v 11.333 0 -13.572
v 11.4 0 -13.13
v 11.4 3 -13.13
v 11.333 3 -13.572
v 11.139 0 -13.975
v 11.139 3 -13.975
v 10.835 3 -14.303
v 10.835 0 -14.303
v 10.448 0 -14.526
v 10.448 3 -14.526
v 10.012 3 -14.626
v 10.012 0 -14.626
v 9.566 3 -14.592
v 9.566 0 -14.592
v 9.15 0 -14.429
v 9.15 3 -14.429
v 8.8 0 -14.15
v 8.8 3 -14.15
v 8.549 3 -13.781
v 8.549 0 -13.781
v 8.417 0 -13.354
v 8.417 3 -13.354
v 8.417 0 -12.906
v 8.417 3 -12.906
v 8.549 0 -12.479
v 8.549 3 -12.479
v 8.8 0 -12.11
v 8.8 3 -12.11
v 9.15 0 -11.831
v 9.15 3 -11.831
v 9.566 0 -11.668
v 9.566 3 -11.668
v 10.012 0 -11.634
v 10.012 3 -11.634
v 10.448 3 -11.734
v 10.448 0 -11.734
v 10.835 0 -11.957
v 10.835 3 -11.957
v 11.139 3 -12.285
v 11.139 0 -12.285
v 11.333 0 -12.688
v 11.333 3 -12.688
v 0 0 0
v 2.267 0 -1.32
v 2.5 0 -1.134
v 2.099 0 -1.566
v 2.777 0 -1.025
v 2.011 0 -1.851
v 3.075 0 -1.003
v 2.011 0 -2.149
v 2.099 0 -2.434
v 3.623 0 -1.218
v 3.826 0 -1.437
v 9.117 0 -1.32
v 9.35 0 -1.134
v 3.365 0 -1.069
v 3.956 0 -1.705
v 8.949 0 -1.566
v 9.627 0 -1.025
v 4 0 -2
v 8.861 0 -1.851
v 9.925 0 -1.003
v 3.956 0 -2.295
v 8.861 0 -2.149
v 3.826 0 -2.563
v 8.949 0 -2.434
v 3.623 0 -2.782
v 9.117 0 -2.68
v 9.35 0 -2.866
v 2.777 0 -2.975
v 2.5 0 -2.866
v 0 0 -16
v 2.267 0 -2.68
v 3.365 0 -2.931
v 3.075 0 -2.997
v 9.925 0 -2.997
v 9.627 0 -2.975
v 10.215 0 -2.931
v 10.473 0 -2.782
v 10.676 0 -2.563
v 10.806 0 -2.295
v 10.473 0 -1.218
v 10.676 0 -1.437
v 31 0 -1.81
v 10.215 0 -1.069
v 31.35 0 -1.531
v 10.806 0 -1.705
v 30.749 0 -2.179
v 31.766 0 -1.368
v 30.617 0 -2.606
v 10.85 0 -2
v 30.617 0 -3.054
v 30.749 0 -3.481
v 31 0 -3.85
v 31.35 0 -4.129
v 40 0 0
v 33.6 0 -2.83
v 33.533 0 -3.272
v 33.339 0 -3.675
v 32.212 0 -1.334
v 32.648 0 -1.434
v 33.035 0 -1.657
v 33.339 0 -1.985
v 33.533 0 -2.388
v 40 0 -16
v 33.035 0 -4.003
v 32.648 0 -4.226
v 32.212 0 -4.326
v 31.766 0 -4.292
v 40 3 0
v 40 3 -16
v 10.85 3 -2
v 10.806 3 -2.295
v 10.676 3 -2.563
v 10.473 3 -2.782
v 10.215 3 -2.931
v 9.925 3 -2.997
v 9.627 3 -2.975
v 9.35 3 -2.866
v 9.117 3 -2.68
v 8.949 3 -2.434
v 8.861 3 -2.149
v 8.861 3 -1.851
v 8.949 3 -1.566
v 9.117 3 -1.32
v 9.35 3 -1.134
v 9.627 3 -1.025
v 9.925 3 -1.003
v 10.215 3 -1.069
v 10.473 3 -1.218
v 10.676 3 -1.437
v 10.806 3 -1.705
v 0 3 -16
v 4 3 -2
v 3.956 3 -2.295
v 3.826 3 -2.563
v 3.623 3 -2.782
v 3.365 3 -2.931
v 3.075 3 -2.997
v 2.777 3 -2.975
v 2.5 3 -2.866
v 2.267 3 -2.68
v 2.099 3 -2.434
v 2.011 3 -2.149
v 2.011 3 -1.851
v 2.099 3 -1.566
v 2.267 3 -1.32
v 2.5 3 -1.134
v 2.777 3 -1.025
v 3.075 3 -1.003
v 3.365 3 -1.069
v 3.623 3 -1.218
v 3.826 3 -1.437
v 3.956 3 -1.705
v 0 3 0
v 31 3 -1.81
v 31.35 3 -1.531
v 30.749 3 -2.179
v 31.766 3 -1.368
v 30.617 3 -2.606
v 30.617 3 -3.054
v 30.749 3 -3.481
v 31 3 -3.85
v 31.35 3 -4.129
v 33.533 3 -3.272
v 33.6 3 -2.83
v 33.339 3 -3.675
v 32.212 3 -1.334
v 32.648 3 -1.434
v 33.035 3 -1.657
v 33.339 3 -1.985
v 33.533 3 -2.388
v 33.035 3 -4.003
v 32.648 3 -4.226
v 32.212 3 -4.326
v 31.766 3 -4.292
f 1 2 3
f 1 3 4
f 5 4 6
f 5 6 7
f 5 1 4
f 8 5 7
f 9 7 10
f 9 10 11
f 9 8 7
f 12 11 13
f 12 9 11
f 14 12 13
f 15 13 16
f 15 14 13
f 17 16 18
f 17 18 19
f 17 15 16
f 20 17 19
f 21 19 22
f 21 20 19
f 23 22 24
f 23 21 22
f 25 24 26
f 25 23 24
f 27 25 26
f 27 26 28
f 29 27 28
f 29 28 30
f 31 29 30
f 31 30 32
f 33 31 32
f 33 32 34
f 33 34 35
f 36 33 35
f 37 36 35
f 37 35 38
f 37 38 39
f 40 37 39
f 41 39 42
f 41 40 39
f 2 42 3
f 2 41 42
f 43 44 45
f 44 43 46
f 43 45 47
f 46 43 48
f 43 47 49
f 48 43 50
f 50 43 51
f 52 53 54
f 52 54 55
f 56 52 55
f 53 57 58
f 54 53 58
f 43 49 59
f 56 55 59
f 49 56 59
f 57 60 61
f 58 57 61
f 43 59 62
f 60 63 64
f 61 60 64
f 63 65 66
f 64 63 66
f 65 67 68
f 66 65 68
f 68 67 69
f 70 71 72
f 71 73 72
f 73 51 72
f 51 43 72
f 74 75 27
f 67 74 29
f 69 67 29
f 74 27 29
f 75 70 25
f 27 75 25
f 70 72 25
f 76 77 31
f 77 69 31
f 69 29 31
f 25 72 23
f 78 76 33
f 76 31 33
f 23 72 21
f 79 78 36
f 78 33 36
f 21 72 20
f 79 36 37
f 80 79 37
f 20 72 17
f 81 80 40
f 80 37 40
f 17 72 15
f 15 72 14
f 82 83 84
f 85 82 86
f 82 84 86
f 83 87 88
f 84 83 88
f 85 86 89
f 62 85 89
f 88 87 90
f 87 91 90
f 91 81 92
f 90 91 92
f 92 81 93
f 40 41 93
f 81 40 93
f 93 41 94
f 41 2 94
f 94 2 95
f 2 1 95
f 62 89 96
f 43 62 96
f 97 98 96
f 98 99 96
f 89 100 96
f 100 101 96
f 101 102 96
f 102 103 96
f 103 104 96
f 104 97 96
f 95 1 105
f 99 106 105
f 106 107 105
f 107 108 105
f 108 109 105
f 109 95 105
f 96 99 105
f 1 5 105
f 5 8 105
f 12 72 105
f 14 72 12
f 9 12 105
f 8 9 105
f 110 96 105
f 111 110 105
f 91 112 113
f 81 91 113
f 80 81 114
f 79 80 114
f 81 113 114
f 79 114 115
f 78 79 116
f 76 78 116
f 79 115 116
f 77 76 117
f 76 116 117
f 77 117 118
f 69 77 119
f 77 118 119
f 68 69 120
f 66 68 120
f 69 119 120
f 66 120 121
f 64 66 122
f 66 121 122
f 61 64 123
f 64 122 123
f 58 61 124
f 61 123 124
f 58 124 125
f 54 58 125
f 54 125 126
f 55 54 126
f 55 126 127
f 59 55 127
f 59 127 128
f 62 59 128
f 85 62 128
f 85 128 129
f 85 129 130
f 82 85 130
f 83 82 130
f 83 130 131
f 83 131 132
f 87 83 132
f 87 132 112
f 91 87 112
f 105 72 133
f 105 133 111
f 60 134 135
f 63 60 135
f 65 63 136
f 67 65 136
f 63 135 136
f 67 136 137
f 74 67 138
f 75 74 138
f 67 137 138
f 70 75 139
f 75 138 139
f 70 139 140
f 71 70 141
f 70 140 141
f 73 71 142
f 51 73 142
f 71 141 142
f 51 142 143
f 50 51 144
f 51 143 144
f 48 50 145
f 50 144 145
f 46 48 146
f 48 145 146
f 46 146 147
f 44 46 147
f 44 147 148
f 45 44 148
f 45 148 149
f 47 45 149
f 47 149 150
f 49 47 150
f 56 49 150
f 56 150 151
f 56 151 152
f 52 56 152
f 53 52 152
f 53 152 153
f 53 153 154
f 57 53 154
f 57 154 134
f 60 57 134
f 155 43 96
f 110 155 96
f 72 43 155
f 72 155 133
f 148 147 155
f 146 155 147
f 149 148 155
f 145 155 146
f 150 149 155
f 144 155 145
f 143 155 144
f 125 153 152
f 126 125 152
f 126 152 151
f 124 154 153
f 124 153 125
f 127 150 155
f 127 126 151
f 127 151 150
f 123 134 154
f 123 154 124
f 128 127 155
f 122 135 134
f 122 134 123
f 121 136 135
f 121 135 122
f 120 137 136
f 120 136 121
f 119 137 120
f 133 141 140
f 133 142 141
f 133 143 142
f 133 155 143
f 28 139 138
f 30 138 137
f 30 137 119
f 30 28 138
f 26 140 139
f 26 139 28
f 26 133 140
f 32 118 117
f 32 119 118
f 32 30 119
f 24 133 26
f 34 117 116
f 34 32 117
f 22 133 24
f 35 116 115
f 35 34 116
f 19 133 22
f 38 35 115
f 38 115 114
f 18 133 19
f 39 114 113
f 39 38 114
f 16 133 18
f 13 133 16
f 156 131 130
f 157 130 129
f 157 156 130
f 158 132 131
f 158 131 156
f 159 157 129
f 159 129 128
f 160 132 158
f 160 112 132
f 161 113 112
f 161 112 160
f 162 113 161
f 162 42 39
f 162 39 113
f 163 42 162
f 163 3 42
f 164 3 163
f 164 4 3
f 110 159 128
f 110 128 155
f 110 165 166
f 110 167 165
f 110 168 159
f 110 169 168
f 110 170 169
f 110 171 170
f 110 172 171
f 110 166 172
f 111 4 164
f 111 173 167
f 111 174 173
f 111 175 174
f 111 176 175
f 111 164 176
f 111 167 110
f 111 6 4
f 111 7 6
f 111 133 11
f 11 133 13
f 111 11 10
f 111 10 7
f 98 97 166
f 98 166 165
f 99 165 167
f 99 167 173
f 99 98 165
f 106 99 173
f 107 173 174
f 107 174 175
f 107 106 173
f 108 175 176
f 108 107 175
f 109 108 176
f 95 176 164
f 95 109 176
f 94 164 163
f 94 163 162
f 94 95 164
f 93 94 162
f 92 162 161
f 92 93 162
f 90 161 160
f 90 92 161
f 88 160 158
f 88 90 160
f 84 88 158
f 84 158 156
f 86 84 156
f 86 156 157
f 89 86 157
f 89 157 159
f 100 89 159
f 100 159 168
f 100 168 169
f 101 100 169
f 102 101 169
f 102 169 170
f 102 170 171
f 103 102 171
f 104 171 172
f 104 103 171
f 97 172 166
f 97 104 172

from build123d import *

# Parameters (mm, degrees)
SKETCH1_W           = 40
SKETCH1_H           = 16
SKETCH1_R           = 1.5
BOSS_EXTRUDE1_DEPTH = 3
SKETCH2_R           = 1
CUT_EXTRUDE1_DEPTH  = 10


with BuildPart() as part:
    # Sketch1 → Boss-Extrude1 (new body)
    with BuildSketch(Plane(origin=(0, 0, 0), x_dir=(1, 0, 0), z_dir=(0, 1, 0))):
        with Locations((20, 8)):
            Rectangle(SKETCH1_W, SKETCH1_H)
        with Locations((9.9, 13.13)):
            Circle(SKETCH1_R, mode=Mode.SUBTRACT)
        with Locations((32.1, 2.83)):
            Circle(SKETCH1_R, mode=Mode.SUBTRACT)
    extrude(amount=BOSS_EXTRUDE1_DEPTH)

    # Sketch2 → Cut-Extrude1 (cut)
    with BuildSketch(Plane(origin=(0, 3, 0), x_dir=(1, 0, 0), z_dir=(0, 1, 0))):
        with Locations((3, 2)):
            Circle(SKETCH2_R)
        with Locations((9.85, 2)):
            Circle(SKETCH2_R)
    extrude(amount=-CUT_EXTRUDE1_DEPTH, mode=Mode.SUBTRACT)


solid = part.part
